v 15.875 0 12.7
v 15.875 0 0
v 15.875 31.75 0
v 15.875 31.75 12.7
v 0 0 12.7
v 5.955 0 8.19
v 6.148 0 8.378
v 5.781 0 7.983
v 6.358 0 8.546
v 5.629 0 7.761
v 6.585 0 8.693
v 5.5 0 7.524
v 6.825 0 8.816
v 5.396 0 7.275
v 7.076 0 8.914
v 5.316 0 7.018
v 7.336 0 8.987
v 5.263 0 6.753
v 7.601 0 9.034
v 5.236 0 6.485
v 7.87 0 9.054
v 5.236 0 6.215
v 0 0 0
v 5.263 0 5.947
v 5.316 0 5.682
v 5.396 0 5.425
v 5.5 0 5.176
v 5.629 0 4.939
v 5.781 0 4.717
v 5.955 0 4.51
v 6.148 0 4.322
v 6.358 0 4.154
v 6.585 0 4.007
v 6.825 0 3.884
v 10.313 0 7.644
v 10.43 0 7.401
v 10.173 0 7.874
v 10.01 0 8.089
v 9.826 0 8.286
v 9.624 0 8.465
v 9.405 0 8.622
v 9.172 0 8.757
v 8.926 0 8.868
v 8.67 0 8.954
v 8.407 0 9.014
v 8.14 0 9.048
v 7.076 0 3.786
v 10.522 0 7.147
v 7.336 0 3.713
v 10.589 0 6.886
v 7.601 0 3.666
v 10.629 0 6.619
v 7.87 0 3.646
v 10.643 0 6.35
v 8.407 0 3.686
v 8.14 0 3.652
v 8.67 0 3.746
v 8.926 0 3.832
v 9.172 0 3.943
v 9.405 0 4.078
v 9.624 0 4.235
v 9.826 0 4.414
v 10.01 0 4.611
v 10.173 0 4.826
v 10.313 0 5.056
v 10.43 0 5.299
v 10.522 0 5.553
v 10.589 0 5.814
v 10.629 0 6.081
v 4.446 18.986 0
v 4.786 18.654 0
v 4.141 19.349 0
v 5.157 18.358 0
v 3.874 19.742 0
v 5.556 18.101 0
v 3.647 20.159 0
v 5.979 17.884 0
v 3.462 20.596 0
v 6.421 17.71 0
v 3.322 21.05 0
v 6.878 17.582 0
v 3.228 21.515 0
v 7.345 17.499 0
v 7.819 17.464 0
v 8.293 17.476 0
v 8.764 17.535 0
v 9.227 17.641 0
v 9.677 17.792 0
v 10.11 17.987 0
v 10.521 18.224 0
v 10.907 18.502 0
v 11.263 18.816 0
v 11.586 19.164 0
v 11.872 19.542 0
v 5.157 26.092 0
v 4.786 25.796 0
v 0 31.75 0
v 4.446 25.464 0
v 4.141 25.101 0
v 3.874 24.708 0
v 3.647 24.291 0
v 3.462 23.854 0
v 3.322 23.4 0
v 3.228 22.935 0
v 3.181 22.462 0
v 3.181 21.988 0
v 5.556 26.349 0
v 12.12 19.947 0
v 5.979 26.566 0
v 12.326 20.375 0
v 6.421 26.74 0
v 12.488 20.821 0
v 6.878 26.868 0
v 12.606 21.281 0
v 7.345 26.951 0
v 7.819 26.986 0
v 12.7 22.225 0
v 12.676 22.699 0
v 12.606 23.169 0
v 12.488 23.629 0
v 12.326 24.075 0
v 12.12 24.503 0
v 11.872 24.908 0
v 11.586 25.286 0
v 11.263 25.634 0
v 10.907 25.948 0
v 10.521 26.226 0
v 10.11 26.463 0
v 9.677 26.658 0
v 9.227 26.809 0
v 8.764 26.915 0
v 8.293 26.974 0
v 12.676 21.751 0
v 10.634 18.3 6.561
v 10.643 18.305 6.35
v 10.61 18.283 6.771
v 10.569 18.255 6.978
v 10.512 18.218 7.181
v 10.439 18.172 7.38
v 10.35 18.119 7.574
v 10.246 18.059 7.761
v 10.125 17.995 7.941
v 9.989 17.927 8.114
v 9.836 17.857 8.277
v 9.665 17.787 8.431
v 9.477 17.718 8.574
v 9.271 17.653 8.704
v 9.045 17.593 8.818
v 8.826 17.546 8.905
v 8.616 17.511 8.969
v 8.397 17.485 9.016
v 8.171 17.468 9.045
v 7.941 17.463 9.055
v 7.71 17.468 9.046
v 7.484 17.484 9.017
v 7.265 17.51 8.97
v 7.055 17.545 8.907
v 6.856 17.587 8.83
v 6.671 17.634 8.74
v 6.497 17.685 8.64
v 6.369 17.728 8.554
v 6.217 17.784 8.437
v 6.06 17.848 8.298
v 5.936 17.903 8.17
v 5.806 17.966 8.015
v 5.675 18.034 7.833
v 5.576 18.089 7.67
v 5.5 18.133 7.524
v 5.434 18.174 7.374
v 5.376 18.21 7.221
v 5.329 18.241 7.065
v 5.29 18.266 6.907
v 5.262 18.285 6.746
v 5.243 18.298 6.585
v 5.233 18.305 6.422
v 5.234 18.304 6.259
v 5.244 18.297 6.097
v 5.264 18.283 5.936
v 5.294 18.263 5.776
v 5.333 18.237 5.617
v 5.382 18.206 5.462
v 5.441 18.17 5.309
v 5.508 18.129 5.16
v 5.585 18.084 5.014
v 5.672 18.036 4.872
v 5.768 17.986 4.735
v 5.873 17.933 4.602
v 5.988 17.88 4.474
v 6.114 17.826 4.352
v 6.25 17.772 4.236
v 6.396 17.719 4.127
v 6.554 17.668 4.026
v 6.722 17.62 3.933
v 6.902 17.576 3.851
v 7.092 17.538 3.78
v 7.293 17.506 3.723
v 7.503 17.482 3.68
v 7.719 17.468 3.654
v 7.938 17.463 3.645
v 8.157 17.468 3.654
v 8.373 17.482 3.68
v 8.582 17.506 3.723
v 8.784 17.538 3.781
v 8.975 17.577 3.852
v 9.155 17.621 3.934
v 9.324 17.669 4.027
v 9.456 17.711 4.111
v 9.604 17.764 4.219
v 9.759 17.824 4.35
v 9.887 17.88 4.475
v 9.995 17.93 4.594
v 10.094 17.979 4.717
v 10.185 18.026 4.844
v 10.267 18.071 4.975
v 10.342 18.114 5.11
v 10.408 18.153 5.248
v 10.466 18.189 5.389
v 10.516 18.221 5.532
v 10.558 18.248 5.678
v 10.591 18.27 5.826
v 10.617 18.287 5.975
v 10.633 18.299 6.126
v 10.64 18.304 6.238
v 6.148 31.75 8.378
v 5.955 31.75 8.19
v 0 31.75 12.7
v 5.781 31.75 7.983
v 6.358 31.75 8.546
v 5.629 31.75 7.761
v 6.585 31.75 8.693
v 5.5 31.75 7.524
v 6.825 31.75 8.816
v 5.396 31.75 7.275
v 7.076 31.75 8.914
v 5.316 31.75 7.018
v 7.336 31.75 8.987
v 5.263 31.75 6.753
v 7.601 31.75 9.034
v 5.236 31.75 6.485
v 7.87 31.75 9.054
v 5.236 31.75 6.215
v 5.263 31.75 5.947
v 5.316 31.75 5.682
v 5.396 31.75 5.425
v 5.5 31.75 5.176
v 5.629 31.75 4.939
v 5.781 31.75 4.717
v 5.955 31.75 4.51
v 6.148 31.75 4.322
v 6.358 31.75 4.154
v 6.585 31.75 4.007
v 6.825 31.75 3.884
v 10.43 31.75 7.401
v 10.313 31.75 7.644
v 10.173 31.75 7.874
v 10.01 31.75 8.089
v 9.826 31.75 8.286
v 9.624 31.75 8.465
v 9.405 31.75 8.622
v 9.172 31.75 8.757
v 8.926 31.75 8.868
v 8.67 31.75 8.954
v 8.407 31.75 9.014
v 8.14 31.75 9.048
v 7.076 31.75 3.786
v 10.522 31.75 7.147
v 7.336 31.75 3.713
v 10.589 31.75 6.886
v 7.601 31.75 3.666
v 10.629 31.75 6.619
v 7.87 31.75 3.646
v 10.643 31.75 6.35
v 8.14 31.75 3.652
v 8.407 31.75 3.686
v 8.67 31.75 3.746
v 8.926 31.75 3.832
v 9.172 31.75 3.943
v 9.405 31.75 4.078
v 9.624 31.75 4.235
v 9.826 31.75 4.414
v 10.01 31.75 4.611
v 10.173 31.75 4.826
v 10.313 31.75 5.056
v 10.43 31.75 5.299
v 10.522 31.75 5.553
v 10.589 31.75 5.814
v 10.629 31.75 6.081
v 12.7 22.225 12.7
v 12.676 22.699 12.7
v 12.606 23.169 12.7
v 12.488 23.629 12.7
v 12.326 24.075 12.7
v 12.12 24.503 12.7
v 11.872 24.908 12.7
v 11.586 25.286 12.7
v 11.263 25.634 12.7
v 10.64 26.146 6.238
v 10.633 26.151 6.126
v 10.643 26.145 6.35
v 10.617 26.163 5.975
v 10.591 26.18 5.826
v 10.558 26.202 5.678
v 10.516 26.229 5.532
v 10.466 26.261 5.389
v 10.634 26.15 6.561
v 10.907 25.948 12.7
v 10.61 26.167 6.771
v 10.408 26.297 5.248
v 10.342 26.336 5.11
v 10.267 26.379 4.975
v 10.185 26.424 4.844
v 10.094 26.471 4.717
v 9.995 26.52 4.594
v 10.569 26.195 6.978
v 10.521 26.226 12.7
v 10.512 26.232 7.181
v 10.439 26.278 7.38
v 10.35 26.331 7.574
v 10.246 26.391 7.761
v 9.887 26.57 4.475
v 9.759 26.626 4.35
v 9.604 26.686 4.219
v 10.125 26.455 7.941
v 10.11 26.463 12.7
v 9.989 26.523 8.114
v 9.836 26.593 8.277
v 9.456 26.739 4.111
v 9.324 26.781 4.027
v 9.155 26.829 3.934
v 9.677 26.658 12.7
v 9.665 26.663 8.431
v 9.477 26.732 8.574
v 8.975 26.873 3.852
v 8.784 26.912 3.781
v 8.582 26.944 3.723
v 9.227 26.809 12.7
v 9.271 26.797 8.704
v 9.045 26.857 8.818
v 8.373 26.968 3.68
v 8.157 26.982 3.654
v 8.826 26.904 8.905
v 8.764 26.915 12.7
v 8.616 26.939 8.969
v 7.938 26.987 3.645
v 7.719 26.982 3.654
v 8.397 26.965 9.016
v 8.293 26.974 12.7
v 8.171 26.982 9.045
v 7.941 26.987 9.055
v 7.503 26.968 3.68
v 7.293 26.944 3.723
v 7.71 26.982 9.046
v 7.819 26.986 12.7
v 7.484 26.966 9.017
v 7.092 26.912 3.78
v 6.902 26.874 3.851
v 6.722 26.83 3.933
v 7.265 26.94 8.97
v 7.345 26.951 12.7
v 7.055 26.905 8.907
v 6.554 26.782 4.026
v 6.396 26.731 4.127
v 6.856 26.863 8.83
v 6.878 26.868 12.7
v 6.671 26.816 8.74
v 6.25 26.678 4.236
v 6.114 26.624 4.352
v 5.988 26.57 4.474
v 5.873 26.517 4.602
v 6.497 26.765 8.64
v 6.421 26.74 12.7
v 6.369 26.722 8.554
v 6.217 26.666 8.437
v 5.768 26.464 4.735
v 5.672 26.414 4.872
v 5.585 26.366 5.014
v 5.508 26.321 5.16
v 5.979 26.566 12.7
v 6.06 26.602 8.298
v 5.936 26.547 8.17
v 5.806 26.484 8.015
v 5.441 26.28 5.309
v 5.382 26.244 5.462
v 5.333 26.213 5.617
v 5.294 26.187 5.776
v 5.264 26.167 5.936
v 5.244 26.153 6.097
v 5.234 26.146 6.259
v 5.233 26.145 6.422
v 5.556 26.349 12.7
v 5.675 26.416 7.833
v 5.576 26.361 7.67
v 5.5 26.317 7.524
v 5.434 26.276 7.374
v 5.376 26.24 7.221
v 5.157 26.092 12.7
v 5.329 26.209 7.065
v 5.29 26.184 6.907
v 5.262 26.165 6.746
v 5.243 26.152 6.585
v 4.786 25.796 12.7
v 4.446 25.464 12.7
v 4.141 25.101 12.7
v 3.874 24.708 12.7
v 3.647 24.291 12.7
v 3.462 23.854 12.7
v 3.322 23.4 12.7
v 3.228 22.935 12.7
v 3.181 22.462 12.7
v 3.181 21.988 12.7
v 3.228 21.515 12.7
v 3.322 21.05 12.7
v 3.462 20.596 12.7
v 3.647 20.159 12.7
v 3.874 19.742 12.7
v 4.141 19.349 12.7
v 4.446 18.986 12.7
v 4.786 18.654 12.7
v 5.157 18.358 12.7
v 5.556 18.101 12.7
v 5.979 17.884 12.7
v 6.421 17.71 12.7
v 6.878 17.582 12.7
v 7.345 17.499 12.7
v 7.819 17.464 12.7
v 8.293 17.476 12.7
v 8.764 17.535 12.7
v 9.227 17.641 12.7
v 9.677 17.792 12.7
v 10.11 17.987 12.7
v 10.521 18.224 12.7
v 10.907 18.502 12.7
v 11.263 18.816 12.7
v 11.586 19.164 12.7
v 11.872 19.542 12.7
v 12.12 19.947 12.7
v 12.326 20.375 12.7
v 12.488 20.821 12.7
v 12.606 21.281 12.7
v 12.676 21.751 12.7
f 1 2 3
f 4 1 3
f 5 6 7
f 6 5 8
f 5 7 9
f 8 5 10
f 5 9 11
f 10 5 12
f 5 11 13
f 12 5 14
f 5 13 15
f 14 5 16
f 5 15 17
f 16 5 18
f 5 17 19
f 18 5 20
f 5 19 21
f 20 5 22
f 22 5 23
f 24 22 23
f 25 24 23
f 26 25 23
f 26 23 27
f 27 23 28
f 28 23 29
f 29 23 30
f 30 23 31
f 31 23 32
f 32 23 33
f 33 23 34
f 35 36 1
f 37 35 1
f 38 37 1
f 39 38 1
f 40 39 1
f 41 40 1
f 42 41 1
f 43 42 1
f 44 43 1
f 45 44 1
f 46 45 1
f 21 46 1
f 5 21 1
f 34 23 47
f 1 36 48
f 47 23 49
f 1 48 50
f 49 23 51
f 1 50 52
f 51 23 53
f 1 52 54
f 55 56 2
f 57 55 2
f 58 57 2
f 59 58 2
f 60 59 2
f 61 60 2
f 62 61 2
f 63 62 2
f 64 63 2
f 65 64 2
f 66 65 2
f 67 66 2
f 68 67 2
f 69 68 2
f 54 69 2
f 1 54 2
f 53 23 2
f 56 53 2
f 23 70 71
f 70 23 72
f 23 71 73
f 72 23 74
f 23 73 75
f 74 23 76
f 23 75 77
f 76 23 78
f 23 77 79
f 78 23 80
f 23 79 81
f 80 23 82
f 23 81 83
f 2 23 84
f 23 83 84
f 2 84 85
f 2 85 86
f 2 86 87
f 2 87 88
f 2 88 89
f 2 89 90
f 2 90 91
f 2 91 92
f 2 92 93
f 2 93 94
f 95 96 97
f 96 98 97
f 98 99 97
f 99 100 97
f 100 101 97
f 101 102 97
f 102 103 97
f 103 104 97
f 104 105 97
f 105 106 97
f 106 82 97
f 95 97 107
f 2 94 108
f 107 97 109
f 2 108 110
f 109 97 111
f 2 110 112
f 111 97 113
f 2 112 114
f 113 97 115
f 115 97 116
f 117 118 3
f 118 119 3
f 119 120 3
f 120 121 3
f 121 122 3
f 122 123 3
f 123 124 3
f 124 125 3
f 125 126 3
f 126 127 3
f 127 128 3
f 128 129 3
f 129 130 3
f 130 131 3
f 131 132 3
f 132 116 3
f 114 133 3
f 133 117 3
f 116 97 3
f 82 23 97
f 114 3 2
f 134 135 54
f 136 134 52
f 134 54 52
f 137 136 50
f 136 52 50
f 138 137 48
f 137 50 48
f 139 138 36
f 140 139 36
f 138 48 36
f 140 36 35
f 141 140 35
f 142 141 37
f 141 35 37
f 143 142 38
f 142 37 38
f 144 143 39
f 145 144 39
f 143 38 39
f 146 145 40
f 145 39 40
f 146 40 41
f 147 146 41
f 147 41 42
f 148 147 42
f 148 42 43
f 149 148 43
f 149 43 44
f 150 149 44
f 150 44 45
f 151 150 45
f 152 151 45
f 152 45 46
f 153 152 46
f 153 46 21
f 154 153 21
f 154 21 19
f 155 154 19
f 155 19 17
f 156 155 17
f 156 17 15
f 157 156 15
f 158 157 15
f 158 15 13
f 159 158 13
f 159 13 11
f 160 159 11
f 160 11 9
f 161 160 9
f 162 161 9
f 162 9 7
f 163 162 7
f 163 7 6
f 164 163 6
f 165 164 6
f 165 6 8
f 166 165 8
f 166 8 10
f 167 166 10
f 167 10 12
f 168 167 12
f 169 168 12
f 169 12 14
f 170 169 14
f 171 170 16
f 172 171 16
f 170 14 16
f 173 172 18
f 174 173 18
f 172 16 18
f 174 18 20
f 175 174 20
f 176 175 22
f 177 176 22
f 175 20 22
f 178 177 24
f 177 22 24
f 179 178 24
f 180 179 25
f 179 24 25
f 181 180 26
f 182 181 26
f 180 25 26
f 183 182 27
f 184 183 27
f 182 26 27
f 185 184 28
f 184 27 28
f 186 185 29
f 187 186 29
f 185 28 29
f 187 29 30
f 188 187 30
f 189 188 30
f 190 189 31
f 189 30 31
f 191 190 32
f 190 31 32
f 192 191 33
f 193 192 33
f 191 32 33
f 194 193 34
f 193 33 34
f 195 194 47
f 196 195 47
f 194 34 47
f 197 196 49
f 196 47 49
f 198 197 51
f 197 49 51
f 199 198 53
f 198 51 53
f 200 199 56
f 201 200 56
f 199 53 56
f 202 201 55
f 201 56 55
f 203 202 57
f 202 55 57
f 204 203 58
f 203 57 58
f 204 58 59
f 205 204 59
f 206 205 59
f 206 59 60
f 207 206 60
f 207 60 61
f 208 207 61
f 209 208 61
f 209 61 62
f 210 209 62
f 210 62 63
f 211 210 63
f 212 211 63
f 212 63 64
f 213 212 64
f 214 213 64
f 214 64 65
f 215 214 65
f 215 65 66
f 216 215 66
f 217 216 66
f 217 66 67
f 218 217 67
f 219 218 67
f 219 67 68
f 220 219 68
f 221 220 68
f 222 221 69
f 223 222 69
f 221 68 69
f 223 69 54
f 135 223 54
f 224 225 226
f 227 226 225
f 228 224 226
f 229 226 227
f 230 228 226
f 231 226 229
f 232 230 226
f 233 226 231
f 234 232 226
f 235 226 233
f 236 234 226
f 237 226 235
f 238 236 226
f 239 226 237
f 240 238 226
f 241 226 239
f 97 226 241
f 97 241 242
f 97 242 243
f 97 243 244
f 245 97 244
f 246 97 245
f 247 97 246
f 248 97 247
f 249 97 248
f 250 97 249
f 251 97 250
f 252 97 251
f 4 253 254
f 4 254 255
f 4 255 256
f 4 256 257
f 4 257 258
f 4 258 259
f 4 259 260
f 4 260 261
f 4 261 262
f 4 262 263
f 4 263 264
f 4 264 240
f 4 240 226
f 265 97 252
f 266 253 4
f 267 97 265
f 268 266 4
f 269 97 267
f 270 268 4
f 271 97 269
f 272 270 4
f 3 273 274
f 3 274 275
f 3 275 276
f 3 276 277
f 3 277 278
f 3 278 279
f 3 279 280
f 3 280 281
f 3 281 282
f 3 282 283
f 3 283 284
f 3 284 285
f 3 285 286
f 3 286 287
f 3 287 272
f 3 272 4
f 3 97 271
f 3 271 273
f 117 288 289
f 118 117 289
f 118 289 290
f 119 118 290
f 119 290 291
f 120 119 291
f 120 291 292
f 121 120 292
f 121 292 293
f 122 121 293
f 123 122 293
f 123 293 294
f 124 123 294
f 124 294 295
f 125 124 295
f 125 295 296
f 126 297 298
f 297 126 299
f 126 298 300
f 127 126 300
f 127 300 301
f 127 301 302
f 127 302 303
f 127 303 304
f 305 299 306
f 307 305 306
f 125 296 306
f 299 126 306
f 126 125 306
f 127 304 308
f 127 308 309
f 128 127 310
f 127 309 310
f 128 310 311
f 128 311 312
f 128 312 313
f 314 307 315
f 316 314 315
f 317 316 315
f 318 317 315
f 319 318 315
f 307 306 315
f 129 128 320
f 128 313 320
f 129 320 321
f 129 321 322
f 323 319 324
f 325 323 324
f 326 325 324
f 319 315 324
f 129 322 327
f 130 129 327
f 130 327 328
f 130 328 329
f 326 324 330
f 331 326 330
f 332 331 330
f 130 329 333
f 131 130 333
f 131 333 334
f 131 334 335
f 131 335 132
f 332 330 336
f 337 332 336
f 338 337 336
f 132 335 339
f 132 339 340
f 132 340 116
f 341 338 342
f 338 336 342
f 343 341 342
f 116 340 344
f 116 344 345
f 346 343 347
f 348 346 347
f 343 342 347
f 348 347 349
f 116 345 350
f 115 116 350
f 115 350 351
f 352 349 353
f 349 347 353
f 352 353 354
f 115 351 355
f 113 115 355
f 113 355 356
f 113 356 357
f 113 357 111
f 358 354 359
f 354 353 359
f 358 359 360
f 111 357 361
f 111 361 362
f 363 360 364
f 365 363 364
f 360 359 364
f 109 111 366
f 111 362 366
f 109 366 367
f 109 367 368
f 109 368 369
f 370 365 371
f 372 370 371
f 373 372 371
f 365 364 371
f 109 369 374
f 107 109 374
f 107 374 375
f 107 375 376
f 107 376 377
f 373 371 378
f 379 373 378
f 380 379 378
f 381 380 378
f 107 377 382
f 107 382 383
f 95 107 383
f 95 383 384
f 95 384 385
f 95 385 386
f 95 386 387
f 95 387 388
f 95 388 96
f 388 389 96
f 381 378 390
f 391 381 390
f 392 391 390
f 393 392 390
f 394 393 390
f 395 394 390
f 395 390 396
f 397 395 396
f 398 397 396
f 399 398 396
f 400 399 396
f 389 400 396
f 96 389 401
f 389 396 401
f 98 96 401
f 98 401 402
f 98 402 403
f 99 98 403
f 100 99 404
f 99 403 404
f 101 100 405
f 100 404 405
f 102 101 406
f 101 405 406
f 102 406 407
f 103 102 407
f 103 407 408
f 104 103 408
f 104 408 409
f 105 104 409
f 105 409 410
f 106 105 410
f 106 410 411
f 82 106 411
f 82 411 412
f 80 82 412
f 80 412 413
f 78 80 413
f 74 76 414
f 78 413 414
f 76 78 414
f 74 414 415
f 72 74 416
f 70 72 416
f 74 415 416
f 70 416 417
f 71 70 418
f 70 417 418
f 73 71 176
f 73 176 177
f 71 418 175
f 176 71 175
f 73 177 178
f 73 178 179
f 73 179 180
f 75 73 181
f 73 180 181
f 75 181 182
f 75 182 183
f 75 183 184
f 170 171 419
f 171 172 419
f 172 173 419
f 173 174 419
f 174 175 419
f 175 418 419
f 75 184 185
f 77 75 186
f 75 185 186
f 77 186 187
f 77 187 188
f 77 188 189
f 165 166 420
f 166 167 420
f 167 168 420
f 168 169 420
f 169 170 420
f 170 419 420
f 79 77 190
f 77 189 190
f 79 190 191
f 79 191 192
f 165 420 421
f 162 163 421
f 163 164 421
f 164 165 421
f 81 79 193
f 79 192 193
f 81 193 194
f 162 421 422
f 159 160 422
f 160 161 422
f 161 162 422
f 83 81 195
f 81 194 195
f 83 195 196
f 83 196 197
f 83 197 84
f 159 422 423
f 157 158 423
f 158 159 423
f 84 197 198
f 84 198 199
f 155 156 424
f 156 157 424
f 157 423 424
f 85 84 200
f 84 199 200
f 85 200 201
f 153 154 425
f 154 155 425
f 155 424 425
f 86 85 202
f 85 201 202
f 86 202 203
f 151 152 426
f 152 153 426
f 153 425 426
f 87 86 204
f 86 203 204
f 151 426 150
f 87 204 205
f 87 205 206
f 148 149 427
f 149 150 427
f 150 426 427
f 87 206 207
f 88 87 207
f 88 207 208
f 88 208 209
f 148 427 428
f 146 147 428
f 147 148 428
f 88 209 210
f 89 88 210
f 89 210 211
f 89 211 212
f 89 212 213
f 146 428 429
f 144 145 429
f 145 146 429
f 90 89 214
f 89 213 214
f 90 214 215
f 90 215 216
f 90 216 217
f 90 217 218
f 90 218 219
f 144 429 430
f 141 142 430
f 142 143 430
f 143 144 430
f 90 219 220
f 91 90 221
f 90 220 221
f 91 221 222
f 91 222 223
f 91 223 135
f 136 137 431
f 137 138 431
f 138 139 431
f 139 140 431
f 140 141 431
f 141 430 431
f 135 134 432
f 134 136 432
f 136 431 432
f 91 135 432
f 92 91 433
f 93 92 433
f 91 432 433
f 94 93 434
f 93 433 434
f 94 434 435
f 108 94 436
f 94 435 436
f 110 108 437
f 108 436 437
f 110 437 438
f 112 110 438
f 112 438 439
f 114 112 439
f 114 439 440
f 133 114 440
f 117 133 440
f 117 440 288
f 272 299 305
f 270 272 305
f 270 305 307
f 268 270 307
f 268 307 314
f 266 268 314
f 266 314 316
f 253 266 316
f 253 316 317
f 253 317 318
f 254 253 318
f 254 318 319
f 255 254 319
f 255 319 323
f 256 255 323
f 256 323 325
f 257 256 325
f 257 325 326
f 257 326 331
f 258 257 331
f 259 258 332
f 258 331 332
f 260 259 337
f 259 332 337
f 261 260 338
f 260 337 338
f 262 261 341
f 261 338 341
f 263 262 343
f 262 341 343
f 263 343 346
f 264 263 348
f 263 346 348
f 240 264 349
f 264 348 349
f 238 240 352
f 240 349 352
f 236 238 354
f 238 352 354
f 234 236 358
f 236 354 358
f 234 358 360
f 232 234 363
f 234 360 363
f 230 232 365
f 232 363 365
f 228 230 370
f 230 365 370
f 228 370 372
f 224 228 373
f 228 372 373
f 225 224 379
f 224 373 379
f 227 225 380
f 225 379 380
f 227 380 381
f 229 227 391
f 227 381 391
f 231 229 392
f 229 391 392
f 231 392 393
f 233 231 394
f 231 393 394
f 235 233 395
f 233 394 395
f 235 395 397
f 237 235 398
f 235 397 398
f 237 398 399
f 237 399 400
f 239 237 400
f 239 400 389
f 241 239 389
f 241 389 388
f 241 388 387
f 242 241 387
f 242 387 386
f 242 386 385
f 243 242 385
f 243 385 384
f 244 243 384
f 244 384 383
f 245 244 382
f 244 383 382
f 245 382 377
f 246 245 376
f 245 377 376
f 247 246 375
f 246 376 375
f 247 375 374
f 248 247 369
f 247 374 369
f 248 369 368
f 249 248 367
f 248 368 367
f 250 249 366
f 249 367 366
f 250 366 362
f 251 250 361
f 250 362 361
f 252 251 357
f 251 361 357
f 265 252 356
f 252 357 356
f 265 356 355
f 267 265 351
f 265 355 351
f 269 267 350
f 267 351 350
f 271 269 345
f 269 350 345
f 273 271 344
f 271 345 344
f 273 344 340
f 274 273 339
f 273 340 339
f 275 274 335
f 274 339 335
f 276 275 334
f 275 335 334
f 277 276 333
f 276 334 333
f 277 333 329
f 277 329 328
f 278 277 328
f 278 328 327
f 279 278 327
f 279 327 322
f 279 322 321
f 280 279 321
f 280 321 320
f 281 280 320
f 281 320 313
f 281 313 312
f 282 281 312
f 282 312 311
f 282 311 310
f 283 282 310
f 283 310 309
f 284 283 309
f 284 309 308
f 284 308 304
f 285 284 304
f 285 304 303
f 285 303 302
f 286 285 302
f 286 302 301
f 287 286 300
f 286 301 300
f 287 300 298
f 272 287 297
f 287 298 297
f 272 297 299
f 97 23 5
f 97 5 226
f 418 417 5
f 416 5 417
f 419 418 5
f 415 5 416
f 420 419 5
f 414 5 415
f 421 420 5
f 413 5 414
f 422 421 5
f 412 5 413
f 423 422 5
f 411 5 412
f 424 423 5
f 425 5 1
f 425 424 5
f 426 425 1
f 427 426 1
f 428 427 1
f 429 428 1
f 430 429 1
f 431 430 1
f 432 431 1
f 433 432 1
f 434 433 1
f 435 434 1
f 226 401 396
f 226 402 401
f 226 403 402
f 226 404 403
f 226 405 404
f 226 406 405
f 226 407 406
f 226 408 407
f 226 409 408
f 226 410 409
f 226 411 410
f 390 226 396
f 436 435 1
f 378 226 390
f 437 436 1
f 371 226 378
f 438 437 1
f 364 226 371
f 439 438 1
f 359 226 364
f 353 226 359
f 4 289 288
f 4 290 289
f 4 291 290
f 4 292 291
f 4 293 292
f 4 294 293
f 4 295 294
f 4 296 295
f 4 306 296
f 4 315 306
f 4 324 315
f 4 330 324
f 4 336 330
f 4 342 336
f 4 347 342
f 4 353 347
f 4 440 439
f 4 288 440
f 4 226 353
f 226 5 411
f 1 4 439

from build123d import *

# Parameters (mm, degrees)
F0_W     = 15.875
F0_H     = 31.75
F1_DEPTH = 12.7
F2_R     = 4.7625
F3_DEPTH = 12.7
F4_R     = 2.7051
F5_DEPTH = 31.75


with BuildPart() as f1:
    # F0 (on Top) → F1 (new body)
    with BuildSketch(Plane.XY):
        with Locations((7.9375, 15.875)):
            Rectangle(F0_W, F0_H)
    extrude(amount=F1_DEPTH)

    # F2 (on face) → F3 (cut, through all)
    with BuildSketch(Plane.XY.offset(12.7)):
        with Locations((7.9375, 22.225)):
            Circle(F2_R)
    extrude(amount=-F3_DEPTH, mode=Mode.SUBTRACT)

    # F4 (on face) → F5 (cut, through all)
    with BuildSketch(Plane.XZ):
        with Locations((7.9375, 6.35)):
            Circle(F4_R)
    extrude(amount=-F5_DEPTH, mode=Mode.SUBTRACT)


solid = f1.part
